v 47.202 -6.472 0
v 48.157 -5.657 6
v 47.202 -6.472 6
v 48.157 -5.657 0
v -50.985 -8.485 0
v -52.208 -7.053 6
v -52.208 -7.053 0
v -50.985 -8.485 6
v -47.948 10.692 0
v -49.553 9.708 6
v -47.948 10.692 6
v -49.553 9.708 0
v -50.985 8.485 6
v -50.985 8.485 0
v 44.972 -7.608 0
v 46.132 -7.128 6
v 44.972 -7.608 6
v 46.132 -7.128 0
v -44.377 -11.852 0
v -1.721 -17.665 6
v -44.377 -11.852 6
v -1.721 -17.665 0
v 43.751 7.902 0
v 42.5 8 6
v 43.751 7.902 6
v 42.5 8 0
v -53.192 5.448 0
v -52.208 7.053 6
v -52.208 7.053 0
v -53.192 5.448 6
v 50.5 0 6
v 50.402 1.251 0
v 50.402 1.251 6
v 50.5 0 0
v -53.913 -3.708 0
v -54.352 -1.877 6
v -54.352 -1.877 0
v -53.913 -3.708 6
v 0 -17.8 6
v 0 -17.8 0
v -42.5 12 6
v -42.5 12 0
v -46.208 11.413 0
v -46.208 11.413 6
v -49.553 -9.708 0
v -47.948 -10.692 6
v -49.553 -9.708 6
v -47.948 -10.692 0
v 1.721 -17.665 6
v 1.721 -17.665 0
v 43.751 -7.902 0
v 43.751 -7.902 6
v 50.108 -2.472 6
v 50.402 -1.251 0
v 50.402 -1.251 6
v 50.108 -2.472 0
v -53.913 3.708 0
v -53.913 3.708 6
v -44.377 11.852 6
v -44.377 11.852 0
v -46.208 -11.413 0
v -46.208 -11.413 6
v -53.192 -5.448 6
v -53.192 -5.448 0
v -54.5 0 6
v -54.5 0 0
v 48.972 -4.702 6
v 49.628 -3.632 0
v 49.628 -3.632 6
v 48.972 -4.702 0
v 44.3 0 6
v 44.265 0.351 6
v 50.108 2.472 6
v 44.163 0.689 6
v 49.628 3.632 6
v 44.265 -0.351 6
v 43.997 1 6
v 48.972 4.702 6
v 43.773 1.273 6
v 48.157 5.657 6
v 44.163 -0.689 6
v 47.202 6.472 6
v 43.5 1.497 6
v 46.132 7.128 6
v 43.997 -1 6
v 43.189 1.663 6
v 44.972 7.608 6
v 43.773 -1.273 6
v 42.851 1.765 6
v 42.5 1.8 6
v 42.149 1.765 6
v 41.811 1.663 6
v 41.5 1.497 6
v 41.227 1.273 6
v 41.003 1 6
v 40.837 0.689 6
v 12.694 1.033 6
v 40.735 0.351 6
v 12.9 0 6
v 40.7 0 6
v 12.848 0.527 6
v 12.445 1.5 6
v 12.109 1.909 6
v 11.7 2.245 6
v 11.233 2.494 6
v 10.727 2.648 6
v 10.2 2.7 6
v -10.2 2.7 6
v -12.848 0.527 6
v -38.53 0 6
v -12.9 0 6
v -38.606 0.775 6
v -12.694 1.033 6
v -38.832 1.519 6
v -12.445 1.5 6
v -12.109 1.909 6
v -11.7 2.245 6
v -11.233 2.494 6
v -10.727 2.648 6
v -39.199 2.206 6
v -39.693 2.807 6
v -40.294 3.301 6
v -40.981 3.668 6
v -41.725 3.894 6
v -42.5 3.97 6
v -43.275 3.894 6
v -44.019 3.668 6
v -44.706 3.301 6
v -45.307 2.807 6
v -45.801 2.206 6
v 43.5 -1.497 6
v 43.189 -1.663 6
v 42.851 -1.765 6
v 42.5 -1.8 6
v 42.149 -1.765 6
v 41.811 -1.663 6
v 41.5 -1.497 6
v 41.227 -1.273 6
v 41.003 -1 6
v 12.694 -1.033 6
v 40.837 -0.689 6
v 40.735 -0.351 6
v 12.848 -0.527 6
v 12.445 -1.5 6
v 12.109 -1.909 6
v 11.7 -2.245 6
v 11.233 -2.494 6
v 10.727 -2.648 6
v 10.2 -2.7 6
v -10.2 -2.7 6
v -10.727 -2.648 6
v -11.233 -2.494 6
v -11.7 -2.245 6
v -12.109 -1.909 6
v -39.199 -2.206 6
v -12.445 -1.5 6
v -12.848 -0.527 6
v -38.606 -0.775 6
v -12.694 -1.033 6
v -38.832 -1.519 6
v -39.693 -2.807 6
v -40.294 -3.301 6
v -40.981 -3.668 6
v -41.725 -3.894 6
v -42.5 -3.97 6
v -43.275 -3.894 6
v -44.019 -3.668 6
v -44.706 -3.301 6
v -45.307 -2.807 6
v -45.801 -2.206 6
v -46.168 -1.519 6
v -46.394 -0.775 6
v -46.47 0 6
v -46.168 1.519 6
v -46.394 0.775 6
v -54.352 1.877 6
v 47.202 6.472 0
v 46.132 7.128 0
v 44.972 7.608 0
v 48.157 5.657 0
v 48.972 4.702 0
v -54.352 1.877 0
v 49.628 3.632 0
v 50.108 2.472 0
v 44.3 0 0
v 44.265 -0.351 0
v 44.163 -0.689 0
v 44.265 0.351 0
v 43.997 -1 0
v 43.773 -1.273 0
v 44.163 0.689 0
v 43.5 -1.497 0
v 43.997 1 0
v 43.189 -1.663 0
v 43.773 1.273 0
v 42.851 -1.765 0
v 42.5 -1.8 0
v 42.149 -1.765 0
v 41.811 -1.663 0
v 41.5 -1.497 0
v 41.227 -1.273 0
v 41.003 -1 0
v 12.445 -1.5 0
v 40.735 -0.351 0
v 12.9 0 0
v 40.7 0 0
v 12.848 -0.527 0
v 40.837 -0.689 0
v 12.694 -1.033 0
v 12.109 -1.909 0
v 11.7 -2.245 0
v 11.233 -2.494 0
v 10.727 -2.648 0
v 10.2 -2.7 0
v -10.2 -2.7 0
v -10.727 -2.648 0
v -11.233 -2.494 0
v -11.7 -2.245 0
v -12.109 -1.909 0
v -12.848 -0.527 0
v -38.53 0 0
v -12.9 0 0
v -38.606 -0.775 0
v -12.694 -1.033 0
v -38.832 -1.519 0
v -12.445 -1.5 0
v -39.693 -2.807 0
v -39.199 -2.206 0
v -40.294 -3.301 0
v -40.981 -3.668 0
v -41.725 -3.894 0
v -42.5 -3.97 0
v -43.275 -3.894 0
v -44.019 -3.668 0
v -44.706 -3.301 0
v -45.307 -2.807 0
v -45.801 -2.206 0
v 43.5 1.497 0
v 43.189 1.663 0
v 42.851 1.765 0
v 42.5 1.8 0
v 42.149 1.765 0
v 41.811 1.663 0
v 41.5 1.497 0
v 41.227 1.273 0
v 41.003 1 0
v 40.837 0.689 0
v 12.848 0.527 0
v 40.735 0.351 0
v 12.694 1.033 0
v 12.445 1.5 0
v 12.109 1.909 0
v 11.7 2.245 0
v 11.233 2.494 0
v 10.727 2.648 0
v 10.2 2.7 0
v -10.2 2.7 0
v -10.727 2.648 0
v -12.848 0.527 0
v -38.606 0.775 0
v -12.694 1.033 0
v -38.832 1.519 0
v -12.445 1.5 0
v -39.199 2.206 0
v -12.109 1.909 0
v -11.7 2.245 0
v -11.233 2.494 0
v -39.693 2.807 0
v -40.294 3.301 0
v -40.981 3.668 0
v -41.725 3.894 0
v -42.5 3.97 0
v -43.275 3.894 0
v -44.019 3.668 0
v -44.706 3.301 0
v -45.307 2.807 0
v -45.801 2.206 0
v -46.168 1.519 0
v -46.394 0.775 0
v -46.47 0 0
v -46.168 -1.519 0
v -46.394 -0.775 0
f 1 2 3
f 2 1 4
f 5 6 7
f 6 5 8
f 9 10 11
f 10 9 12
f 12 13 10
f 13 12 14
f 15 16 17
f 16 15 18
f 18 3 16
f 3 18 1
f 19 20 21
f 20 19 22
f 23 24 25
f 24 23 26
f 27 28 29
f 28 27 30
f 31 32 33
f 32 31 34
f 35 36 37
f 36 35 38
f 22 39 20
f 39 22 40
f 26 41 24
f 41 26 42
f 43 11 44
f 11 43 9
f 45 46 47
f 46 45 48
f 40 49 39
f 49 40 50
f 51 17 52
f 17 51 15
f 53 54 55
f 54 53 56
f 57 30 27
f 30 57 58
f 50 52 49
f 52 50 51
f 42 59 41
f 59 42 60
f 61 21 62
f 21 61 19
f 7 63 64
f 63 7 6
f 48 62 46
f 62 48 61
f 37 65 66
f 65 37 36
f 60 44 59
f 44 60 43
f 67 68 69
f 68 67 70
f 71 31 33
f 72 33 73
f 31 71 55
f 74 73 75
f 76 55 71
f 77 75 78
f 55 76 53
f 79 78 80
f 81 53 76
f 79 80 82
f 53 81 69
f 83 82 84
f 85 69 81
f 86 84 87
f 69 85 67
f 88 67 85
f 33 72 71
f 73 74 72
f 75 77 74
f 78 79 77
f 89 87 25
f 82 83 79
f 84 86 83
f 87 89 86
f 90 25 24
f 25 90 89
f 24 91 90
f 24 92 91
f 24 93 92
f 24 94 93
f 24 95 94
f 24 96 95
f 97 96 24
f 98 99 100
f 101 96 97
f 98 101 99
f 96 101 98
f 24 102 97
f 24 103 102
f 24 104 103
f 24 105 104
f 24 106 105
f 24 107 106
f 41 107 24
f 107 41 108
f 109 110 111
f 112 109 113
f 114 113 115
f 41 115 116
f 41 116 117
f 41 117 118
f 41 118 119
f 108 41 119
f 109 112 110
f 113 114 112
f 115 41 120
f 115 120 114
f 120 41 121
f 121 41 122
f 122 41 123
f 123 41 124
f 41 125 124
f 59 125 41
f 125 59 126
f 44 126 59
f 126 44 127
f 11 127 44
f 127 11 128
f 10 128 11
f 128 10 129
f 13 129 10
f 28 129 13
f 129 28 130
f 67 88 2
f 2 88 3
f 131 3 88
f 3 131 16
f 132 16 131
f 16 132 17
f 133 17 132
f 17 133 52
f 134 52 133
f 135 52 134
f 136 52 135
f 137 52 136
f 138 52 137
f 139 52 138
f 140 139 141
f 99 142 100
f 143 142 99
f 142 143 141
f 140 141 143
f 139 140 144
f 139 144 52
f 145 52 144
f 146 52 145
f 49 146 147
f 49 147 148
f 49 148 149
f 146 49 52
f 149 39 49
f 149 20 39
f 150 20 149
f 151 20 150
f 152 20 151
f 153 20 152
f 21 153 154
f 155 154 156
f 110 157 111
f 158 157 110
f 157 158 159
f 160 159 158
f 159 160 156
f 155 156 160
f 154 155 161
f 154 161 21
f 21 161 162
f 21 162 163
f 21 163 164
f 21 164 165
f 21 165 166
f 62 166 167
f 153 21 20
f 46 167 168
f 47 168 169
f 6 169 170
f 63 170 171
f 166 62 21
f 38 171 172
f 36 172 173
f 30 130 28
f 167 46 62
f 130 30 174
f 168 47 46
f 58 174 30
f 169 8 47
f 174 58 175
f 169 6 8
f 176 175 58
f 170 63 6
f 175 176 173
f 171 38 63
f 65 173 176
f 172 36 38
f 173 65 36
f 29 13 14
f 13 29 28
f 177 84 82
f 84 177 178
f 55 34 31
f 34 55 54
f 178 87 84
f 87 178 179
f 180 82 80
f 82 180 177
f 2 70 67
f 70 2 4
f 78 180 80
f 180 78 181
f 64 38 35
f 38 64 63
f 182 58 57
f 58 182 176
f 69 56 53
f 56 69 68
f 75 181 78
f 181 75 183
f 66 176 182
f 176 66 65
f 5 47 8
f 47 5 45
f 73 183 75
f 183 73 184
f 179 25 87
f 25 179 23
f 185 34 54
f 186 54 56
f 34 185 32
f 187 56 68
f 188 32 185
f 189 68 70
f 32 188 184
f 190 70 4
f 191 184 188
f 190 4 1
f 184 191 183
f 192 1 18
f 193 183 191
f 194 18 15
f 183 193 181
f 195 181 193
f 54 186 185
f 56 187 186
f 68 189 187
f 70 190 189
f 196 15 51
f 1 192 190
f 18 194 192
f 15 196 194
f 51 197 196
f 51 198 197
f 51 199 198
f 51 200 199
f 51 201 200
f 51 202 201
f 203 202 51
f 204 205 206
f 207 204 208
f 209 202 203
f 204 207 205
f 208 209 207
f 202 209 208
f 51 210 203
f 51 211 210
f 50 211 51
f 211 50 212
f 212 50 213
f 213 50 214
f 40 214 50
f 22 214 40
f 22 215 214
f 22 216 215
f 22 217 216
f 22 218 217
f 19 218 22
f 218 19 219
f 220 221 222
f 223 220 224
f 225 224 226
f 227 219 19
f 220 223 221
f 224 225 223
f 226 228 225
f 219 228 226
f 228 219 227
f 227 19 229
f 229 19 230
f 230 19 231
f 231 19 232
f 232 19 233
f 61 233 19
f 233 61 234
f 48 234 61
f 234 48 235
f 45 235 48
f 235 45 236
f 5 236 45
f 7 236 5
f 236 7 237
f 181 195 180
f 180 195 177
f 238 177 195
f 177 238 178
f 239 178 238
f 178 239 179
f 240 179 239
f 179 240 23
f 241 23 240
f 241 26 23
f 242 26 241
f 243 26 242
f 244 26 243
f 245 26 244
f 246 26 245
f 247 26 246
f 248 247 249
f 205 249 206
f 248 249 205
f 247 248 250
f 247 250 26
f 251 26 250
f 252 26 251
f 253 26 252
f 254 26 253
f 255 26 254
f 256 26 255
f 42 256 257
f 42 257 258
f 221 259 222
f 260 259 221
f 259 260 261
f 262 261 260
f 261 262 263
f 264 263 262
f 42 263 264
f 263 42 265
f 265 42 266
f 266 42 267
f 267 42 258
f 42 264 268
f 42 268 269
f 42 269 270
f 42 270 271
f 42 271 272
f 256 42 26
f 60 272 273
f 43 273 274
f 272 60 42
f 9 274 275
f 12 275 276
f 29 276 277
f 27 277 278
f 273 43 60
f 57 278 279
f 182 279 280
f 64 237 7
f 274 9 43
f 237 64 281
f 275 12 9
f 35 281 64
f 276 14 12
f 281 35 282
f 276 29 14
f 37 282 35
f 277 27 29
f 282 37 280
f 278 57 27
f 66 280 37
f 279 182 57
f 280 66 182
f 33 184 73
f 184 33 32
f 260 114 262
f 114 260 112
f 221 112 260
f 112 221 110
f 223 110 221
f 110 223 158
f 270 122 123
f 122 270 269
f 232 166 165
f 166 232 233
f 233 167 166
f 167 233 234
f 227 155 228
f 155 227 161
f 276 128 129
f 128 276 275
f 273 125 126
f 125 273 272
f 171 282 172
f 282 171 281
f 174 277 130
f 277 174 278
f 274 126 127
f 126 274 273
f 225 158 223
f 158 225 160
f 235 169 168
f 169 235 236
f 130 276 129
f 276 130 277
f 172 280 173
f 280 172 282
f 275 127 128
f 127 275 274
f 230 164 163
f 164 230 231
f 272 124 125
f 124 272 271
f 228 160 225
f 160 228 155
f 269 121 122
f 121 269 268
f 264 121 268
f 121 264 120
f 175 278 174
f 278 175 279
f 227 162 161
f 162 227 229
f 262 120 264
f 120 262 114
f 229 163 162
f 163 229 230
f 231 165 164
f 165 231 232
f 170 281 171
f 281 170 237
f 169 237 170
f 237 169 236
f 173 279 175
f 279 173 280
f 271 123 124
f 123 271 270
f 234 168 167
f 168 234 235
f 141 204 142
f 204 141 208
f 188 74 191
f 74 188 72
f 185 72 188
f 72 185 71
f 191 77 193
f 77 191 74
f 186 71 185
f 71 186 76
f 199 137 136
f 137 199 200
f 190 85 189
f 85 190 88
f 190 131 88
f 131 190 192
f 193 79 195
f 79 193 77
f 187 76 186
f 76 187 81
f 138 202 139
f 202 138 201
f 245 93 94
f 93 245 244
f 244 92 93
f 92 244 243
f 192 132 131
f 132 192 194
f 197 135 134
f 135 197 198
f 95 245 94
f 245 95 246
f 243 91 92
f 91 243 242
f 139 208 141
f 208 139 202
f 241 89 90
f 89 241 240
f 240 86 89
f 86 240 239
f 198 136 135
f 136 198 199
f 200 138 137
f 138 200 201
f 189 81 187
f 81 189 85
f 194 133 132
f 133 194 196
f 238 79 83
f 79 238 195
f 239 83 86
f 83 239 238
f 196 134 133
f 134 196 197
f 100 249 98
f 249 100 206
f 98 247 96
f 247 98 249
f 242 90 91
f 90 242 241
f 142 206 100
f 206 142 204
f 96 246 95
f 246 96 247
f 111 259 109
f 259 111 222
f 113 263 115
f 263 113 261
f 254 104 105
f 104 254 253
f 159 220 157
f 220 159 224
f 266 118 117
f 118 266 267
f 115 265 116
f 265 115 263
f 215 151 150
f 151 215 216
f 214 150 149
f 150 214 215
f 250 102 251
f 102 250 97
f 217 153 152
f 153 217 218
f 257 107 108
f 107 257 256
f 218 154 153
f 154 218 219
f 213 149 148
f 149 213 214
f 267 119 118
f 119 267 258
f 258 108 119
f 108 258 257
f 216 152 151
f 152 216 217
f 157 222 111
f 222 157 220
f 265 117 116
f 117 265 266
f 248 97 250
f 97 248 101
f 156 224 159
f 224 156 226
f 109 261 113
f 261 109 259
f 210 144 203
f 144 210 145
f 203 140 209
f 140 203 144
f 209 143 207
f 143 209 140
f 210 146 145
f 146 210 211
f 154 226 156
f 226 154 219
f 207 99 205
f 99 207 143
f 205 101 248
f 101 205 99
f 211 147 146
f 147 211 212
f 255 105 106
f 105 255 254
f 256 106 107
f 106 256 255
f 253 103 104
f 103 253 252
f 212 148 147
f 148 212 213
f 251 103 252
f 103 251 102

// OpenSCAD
$fn = 32;

// ----------------------------------------------------------------------
// Lever: 85 mm between the bosses, 6 mm thick, smooth outline
// ----------------------------------------------------------------------

// --- parameters (mm) ---
lever_l = 85;             // distance between the boss centres
boss_a = 24;              // first boss diameter
boss_b = 16;              // second boss diameter
bore_a = 7.94;            // first bore
bore_b = 3.6;             // second bore
lever_t = 6;              // lever thickness
boss_c = 22;              // middle boss diameter
bend = 6.8;               // how far the middle boss drops
slot_w = 5.4;             // adjustment slot width

lever_profile = [[-54.5, 0], [-54.352, -1.877], [-53.913, -3.708], [-53.192, -5.448], [-52.208, -7.053], [-50.985, -8.485], [-49.553, -9.708], [-47.948, -10.692], [-46.208, -11.413], [-44.377, -11.852], [-1.721, -17.665], [0, -17.8], [1.721, -17.665], [43.751, -7.902], [44.972, -7.608], [46.132, -7.128], [47.202, -6.472], [48.157, -5.657], [48.972, -4.702], [49.628, -3.632], [50.108, -2.472], [50.402, -1.251], [50.5, 0], [50.402, 1.251], [50.108, 2.472], [49.628, 3.632], [48.972, 4.702], [48.157, 5.657], [47.202, 6.472], [46.132, 7.128], [44.972, 7.608], [43.751, 7.902], [42.5, 8], [-42.5, 12], [-44.377, 11.852], [-46.208, 11.413], [-47.948, 10.692], [-49.553, 9.708], [-50.985, 8.485], [-52.208, 7.053], [-53.192, 5.448], [-53.913, 3.708], [-54.352, 1.877]];

difference() {
  linear_extrude(height = lever_t) polygon(lever_profile);
  translate([-42.5, 0, -2.5]) cylinder(h = lever_t + 5, d = bore_a);
  translate([42.5, 0, -2.5]) cylinder(h = lever_t + 5, d = bore_b);
  /* slotted adjustment, stadium shaped */
  hull() {
    translate([-10.2, 0, -2.5]) cylinder(h = lever_t + 5, d = slot_w);
    translate([10.2, 0, -2.5]) cylinder(h = lever_t + 5, d = slot_w);
  }
}
